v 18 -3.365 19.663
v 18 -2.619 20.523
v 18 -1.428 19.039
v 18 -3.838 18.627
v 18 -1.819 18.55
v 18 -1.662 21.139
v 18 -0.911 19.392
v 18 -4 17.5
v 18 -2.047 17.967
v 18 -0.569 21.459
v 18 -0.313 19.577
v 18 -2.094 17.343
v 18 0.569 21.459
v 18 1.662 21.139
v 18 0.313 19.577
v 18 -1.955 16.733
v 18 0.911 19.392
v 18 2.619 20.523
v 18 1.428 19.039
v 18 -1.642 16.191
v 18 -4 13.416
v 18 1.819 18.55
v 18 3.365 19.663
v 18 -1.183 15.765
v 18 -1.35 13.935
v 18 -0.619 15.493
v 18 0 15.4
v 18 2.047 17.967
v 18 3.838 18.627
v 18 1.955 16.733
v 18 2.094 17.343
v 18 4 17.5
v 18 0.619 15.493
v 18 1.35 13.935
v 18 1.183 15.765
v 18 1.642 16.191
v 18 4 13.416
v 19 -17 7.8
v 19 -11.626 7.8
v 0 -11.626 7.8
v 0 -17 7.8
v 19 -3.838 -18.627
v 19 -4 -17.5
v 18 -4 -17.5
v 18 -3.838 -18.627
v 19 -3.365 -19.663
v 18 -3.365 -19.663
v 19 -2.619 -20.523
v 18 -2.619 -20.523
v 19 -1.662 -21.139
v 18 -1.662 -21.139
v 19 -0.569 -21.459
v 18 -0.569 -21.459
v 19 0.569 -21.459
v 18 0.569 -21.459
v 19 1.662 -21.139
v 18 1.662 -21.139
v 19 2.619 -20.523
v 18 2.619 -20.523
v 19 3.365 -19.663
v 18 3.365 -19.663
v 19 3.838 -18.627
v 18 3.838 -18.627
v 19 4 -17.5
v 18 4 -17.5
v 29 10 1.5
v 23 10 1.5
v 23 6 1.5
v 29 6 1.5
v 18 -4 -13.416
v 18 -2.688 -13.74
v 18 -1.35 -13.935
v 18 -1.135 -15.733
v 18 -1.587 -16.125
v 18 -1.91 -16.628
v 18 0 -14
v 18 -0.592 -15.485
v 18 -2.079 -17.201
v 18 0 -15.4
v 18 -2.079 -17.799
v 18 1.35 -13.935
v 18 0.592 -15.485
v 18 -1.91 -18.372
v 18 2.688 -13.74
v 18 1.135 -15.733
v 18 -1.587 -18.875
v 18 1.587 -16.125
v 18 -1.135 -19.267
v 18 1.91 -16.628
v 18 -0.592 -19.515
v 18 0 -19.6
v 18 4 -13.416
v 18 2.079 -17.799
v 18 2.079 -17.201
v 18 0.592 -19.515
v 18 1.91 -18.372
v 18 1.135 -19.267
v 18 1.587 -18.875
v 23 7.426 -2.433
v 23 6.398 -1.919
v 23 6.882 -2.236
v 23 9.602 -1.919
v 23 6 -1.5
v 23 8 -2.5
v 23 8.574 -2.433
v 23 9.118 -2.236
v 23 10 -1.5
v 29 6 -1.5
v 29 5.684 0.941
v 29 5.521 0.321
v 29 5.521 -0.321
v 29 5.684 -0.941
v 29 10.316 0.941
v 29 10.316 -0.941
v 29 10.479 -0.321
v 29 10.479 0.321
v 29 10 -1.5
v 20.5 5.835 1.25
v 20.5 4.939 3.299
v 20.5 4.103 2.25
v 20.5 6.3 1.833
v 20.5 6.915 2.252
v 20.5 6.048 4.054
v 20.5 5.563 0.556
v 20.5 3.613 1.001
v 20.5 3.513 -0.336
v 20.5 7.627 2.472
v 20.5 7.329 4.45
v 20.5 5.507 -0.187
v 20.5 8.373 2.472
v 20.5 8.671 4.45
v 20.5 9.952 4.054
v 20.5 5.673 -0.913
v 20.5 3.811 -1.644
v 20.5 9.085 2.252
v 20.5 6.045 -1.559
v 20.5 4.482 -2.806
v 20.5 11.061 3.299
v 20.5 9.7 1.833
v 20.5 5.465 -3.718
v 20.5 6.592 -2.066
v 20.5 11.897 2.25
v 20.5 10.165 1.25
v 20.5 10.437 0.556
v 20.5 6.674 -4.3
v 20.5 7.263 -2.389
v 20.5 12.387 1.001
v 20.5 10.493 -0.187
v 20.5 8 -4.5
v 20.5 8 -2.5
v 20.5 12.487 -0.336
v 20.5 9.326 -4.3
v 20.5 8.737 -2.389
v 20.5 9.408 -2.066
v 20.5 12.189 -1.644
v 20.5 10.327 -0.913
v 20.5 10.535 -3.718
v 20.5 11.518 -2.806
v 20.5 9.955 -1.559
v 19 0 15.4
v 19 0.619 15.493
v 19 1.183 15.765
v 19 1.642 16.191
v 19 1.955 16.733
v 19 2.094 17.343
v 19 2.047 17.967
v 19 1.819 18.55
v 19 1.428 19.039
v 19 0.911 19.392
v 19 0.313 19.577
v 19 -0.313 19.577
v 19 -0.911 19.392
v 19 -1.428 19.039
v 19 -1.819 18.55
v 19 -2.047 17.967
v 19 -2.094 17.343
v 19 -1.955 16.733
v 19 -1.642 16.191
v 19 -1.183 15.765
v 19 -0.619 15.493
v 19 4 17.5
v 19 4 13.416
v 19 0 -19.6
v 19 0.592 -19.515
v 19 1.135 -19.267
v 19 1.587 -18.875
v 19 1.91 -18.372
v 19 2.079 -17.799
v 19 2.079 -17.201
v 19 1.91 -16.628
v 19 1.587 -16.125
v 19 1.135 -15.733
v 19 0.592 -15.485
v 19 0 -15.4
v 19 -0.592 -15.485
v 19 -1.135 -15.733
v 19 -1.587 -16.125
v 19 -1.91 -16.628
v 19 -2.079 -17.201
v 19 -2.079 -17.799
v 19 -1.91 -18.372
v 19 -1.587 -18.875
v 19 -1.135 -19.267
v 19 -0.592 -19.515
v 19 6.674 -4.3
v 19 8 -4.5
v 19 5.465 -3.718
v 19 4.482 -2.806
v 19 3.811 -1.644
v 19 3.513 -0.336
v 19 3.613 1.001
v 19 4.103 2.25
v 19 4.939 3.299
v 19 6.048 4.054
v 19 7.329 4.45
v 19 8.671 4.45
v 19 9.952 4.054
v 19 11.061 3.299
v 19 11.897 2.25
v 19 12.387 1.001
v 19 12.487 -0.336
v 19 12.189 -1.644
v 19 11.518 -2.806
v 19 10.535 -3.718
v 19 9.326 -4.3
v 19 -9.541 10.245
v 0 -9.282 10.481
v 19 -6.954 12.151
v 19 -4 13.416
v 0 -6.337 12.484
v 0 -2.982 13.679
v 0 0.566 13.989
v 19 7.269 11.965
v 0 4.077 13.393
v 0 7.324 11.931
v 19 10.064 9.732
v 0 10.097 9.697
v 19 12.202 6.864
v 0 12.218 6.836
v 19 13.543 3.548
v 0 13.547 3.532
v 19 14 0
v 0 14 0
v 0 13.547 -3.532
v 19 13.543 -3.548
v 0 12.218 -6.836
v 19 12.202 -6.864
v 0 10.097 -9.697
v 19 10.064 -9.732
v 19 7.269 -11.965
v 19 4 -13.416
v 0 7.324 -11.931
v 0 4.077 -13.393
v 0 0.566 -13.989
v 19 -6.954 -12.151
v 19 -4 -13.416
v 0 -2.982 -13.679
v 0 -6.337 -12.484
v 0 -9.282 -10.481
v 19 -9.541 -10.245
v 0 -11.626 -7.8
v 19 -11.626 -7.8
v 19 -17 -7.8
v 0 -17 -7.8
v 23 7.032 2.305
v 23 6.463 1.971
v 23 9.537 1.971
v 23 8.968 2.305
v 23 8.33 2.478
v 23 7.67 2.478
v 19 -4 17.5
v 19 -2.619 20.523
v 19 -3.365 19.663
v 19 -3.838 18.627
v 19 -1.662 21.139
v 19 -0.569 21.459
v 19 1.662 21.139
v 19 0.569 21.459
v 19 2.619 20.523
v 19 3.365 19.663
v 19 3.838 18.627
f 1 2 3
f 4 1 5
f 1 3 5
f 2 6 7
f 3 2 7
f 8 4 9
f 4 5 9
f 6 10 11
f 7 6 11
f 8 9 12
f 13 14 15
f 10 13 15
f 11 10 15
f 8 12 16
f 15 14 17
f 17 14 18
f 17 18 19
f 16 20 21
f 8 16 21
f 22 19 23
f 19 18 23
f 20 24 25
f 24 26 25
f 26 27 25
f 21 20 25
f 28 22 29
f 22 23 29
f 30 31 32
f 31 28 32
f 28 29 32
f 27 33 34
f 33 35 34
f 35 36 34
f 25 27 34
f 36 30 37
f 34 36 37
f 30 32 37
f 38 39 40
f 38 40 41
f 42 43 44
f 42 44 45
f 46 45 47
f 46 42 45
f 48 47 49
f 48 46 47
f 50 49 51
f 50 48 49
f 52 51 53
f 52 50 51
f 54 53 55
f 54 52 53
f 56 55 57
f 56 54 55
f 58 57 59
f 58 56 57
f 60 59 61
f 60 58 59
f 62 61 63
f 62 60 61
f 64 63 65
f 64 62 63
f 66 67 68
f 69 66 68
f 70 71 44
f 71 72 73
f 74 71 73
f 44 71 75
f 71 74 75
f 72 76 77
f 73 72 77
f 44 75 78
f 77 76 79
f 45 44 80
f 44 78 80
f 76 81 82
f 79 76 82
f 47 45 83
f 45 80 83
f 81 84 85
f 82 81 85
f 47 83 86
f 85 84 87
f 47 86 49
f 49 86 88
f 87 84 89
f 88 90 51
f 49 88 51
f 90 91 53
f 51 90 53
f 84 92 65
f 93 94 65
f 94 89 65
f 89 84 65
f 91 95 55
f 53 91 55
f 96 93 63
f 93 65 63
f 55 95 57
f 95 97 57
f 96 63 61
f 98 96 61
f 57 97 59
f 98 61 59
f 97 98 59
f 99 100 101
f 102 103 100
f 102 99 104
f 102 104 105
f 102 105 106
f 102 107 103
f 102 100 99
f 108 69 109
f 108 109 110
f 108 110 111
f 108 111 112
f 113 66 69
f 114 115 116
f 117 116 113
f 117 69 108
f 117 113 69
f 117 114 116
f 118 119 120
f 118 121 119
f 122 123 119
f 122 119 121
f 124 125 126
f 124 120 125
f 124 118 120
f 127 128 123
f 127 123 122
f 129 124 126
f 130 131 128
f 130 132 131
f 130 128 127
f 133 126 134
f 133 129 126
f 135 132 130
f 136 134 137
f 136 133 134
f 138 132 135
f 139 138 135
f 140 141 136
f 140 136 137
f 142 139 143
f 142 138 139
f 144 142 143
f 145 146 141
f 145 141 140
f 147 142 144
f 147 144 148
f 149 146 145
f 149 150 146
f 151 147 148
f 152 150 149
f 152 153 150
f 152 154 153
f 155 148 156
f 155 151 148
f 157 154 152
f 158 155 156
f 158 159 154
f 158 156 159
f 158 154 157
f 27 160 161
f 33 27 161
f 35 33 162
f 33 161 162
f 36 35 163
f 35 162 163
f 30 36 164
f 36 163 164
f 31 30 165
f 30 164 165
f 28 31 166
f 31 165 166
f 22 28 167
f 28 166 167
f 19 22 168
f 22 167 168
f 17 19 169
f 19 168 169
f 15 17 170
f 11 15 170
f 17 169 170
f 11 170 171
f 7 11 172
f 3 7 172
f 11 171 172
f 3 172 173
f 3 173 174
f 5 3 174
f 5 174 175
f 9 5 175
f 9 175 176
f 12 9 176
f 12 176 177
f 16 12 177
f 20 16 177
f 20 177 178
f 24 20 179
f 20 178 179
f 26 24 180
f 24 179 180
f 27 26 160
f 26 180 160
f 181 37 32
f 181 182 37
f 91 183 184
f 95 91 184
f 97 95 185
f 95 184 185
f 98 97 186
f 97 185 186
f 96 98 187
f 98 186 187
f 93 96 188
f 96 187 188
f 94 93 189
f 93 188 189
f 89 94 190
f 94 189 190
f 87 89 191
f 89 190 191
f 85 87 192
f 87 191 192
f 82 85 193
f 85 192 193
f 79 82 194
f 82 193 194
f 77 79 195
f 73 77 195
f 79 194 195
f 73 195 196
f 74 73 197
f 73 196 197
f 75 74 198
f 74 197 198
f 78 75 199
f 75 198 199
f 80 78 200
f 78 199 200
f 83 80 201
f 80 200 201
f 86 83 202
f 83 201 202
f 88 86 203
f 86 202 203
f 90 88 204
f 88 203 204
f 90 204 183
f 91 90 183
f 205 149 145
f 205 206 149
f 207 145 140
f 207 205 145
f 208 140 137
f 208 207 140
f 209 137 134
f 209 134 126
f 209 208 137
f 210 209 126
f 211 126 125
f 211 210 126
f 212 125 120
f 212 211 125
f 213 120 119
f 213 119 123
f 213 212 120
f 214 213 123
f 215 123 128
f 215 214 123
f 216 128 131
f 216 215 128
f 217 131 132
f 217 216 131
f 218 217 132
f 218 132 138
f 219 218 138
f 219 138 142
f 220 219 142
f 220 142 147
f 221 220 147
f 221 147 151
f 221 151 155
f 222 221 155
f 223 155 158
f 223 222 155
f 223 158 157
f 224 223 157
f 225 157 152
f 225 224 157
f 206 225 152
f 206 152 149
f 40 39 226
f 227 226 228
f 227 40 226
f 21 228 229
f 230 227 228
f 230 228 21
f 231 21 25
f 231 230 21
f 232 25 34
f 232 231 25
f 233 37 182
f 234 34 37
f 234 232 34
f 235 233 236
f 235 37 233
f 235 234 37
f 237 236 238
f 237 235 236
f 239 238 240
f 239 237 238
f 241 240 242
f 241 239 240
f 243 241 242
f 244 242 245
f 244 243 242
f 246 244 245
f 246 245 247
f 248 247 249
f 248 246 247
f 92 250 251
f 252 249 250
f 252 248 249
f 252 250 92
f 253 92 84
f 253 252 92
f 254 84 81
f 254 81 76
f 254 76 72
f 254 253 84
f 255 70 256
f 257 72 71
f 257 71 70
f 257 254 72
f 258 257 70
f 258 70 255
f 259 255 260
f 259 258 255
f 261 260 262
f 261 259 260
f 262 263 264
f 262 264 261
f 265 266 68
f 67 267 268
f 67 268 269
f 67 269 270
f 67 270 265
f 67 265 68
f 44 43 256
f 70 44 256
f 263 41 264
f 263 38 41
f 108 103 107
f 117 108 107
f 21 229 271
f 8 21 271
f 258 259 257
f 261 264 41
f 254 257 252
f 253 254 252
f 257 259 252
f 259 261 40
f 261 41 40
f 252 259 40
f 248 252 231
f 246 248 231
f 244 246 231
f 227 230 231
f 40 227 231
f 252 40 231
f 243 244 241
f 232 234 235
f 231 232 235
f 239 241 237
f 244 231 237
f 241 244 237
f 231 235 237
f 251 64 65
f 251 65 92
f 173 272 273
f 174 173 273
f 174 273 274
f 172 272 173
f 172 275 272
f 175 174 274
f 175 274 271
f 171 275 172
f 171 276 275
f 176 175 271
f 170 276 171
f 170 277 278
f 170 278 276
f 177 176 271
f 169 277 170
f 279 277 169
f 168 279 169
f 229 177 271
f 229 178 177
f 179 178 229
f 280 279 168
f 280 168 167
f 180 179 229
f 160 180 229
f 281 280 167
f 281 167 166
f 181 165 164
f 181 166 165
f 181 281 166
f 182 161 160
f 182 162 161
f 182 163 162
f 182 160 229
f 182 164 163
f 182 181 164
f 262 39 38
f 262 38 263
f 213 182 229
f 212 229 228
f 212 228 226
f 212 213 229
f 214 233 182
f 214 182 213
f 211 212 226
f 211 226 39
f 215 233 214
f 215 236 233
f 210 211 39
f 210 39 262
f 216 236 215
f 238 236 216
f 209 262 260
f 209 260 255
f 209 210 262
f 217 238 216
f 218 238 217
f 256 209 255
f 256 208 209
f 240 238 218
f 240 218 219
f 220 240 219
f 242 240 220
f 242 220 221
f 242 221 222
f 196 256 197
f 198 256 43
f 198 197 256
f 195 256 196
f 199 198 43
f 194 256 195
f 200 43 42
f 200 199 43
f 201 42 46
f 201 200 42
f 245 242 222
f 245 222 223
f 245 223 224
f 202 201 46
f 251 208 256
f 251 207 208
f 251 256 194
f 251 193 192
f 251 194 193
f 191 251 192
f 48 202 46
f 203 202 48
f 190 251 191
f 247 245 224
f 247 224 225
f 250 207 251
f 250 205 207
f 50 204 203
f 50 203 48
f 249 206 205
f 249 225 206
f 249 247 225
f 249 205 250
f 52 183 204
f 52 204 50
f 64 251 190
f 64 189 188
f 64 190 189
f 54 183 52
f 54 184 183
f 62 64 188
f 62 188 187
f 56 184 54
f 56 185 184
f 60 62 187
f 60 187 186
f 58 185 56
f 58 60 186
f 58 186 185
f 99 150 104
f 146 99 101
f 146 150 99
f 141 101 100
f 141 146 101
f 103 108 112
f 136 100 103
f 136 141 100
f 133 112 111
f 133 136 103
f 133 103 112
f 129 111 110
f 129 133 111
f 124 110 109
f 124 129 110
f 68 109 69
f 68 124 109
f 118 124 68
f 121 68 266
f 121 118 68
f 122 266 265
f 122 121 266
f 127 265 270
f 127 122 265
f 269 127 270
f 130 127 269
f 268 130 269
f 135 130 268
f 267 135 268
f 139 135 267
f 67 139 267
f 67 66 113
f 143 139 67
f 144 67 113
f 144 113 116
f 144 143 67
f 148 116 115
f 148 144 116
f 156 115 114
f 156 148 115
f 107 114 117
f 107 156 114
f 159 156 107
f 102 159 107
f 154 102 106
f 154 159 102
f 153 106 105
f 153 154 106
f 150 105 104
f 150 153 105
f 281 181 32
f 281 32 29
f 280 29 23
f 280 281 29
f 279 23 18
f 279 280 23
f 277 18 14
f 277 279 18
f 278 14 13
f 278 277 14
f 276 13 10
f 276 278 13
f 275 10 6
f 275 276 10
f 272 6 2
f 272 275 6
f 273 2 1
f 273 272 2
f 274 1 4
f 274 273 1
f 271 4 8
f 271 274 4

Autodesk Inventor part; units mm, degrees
ref_plane "YZ Plane" through (0, 0, 0) normal (1, 0, 0) x (0, 1, 0)
ref_plane "XZ Plane" through (0, 0, 0) normal (0, 1, 0) x (-1, 0, 0)
ref_plane "XY Plane" through (0, 0, 0) normal (0, 0, 1) x (1, 0, 0)
sketch "Boceto1" plane through (0, 0, 0) normal (1, 0, 0) x (0, 1, 0)
  circle A0 centre (0, 0) radius 14
  dimension "d0" = 28
extrude "Extrusión1" add sketch "Boceto1" along normal blind 19
sketch "Boceto2" plane through (19, 0, 0) normal (1, 0, 0) x (0, 0, -1)
  line L0 (0, 0) -> (0, 8)
  circle A0 centre (0, 8) radius 4.5
  dimension "d3" = 8
  dimension "d4" = 9
extrude "Extrusión2" add sketch "Boceto2" along normal blind 1.5
sketch "Boceto3" plane through (20.5, 8, 0) normal (1, 0, 0) x (0, 0, -1)
  circle A0 centre (0, 0) radius 2.5
  point P0 (0, -8)
  dimension "d7" = 5
extrude "Extrusión3" add sketch "Boceto3" along normal blind 2.5
sketch "Boceto4" plane through (23, 8, 0) normal (1, 0, 0) x (0, 0, -1)
  line L0 (0, 0) -> (-1.5, 0)
  line L1 (-1.5, 0) -> (-1.5, 3)
  line L2 (-1.5, 3) -> (-1.5, -3)
  line L3 (-1.5, -3) -> (1.5, -3)
  line L4 (1.5, -3) -> (1.5, 2.8642)
  circle A0 centre (0, 0) radius 2.5 projected
  point P0 (0, -8)
  point P1 (1.5, 2)
  point P2 (-1.5, 2)
  point P3 (-1.5, -2)
  point P4 (1.5, -2)
  dimension "d10" = 1.5
  dimension "d11" = 3
extrude "Extrusión4" add sketch "Boceto4" along normal blind 6 contours L1 A0 L4 L2
sketch "Boceto5" plane through (19, 0, 0) normal (1, 0, 0) x (0, 0, -1)
  line L0 (0, 0) -> (17.5, 0)
  circle A0 centre (17.5, 0) radius 2.1
  arc A1 (17.5, -4) -> (17.5, 4) centre (17.5, 0) ccw
  line L1 (17.5, 4) -> (-17.5, 4)
  line L2 (0, 0) -> (0, 18)
  line L3 (-15.4, 0) -> (-17.5, 0)
  circle A2 centre (-17.5, 0) radius 2.1
  arc A3 (-17.5, 4) -> (-17.5, -4) centre (-17.5, 0) ccw
  line L4 (17.5, -4) -> (-17.5, -4)
  dimension "d18" = 4.2
  dimension "d14" = 17.5
  dimension "d15" = 4.2
  dimension "d16" = 8
  dimension "d17" = 17.5
  dimension "d19" = 8
extrude "Extrusión5" add sketch "Boceto5" against normal blind 1
sketch "Boceto6" plane through (19, 0, 0) normal (1, 0, 0) x (0, 0, -1)
  line L0 (0, 0) -> (0, -17)
  line L1 (0, -17) -> (7.8, -17)
  line L2 (0, -17) -> (-7.8, -17)
  line L3 (-7.8, -17) -> (7.8, -17)
  line L4 (7.8, -17) -> (7.8, -6)
  line L5 (7.8, -6) -> (-7.8, -6)
  line L6 (-7.8, -6) -> (-7.8, -17)
  dimension "d22" = 17
  dimension "d23" = 7.8
  dimension "d25" = 7.8
extrude "Extrusión6" add sketch "Boceto6" against normal blind 19
properties part number "MOTOR"
